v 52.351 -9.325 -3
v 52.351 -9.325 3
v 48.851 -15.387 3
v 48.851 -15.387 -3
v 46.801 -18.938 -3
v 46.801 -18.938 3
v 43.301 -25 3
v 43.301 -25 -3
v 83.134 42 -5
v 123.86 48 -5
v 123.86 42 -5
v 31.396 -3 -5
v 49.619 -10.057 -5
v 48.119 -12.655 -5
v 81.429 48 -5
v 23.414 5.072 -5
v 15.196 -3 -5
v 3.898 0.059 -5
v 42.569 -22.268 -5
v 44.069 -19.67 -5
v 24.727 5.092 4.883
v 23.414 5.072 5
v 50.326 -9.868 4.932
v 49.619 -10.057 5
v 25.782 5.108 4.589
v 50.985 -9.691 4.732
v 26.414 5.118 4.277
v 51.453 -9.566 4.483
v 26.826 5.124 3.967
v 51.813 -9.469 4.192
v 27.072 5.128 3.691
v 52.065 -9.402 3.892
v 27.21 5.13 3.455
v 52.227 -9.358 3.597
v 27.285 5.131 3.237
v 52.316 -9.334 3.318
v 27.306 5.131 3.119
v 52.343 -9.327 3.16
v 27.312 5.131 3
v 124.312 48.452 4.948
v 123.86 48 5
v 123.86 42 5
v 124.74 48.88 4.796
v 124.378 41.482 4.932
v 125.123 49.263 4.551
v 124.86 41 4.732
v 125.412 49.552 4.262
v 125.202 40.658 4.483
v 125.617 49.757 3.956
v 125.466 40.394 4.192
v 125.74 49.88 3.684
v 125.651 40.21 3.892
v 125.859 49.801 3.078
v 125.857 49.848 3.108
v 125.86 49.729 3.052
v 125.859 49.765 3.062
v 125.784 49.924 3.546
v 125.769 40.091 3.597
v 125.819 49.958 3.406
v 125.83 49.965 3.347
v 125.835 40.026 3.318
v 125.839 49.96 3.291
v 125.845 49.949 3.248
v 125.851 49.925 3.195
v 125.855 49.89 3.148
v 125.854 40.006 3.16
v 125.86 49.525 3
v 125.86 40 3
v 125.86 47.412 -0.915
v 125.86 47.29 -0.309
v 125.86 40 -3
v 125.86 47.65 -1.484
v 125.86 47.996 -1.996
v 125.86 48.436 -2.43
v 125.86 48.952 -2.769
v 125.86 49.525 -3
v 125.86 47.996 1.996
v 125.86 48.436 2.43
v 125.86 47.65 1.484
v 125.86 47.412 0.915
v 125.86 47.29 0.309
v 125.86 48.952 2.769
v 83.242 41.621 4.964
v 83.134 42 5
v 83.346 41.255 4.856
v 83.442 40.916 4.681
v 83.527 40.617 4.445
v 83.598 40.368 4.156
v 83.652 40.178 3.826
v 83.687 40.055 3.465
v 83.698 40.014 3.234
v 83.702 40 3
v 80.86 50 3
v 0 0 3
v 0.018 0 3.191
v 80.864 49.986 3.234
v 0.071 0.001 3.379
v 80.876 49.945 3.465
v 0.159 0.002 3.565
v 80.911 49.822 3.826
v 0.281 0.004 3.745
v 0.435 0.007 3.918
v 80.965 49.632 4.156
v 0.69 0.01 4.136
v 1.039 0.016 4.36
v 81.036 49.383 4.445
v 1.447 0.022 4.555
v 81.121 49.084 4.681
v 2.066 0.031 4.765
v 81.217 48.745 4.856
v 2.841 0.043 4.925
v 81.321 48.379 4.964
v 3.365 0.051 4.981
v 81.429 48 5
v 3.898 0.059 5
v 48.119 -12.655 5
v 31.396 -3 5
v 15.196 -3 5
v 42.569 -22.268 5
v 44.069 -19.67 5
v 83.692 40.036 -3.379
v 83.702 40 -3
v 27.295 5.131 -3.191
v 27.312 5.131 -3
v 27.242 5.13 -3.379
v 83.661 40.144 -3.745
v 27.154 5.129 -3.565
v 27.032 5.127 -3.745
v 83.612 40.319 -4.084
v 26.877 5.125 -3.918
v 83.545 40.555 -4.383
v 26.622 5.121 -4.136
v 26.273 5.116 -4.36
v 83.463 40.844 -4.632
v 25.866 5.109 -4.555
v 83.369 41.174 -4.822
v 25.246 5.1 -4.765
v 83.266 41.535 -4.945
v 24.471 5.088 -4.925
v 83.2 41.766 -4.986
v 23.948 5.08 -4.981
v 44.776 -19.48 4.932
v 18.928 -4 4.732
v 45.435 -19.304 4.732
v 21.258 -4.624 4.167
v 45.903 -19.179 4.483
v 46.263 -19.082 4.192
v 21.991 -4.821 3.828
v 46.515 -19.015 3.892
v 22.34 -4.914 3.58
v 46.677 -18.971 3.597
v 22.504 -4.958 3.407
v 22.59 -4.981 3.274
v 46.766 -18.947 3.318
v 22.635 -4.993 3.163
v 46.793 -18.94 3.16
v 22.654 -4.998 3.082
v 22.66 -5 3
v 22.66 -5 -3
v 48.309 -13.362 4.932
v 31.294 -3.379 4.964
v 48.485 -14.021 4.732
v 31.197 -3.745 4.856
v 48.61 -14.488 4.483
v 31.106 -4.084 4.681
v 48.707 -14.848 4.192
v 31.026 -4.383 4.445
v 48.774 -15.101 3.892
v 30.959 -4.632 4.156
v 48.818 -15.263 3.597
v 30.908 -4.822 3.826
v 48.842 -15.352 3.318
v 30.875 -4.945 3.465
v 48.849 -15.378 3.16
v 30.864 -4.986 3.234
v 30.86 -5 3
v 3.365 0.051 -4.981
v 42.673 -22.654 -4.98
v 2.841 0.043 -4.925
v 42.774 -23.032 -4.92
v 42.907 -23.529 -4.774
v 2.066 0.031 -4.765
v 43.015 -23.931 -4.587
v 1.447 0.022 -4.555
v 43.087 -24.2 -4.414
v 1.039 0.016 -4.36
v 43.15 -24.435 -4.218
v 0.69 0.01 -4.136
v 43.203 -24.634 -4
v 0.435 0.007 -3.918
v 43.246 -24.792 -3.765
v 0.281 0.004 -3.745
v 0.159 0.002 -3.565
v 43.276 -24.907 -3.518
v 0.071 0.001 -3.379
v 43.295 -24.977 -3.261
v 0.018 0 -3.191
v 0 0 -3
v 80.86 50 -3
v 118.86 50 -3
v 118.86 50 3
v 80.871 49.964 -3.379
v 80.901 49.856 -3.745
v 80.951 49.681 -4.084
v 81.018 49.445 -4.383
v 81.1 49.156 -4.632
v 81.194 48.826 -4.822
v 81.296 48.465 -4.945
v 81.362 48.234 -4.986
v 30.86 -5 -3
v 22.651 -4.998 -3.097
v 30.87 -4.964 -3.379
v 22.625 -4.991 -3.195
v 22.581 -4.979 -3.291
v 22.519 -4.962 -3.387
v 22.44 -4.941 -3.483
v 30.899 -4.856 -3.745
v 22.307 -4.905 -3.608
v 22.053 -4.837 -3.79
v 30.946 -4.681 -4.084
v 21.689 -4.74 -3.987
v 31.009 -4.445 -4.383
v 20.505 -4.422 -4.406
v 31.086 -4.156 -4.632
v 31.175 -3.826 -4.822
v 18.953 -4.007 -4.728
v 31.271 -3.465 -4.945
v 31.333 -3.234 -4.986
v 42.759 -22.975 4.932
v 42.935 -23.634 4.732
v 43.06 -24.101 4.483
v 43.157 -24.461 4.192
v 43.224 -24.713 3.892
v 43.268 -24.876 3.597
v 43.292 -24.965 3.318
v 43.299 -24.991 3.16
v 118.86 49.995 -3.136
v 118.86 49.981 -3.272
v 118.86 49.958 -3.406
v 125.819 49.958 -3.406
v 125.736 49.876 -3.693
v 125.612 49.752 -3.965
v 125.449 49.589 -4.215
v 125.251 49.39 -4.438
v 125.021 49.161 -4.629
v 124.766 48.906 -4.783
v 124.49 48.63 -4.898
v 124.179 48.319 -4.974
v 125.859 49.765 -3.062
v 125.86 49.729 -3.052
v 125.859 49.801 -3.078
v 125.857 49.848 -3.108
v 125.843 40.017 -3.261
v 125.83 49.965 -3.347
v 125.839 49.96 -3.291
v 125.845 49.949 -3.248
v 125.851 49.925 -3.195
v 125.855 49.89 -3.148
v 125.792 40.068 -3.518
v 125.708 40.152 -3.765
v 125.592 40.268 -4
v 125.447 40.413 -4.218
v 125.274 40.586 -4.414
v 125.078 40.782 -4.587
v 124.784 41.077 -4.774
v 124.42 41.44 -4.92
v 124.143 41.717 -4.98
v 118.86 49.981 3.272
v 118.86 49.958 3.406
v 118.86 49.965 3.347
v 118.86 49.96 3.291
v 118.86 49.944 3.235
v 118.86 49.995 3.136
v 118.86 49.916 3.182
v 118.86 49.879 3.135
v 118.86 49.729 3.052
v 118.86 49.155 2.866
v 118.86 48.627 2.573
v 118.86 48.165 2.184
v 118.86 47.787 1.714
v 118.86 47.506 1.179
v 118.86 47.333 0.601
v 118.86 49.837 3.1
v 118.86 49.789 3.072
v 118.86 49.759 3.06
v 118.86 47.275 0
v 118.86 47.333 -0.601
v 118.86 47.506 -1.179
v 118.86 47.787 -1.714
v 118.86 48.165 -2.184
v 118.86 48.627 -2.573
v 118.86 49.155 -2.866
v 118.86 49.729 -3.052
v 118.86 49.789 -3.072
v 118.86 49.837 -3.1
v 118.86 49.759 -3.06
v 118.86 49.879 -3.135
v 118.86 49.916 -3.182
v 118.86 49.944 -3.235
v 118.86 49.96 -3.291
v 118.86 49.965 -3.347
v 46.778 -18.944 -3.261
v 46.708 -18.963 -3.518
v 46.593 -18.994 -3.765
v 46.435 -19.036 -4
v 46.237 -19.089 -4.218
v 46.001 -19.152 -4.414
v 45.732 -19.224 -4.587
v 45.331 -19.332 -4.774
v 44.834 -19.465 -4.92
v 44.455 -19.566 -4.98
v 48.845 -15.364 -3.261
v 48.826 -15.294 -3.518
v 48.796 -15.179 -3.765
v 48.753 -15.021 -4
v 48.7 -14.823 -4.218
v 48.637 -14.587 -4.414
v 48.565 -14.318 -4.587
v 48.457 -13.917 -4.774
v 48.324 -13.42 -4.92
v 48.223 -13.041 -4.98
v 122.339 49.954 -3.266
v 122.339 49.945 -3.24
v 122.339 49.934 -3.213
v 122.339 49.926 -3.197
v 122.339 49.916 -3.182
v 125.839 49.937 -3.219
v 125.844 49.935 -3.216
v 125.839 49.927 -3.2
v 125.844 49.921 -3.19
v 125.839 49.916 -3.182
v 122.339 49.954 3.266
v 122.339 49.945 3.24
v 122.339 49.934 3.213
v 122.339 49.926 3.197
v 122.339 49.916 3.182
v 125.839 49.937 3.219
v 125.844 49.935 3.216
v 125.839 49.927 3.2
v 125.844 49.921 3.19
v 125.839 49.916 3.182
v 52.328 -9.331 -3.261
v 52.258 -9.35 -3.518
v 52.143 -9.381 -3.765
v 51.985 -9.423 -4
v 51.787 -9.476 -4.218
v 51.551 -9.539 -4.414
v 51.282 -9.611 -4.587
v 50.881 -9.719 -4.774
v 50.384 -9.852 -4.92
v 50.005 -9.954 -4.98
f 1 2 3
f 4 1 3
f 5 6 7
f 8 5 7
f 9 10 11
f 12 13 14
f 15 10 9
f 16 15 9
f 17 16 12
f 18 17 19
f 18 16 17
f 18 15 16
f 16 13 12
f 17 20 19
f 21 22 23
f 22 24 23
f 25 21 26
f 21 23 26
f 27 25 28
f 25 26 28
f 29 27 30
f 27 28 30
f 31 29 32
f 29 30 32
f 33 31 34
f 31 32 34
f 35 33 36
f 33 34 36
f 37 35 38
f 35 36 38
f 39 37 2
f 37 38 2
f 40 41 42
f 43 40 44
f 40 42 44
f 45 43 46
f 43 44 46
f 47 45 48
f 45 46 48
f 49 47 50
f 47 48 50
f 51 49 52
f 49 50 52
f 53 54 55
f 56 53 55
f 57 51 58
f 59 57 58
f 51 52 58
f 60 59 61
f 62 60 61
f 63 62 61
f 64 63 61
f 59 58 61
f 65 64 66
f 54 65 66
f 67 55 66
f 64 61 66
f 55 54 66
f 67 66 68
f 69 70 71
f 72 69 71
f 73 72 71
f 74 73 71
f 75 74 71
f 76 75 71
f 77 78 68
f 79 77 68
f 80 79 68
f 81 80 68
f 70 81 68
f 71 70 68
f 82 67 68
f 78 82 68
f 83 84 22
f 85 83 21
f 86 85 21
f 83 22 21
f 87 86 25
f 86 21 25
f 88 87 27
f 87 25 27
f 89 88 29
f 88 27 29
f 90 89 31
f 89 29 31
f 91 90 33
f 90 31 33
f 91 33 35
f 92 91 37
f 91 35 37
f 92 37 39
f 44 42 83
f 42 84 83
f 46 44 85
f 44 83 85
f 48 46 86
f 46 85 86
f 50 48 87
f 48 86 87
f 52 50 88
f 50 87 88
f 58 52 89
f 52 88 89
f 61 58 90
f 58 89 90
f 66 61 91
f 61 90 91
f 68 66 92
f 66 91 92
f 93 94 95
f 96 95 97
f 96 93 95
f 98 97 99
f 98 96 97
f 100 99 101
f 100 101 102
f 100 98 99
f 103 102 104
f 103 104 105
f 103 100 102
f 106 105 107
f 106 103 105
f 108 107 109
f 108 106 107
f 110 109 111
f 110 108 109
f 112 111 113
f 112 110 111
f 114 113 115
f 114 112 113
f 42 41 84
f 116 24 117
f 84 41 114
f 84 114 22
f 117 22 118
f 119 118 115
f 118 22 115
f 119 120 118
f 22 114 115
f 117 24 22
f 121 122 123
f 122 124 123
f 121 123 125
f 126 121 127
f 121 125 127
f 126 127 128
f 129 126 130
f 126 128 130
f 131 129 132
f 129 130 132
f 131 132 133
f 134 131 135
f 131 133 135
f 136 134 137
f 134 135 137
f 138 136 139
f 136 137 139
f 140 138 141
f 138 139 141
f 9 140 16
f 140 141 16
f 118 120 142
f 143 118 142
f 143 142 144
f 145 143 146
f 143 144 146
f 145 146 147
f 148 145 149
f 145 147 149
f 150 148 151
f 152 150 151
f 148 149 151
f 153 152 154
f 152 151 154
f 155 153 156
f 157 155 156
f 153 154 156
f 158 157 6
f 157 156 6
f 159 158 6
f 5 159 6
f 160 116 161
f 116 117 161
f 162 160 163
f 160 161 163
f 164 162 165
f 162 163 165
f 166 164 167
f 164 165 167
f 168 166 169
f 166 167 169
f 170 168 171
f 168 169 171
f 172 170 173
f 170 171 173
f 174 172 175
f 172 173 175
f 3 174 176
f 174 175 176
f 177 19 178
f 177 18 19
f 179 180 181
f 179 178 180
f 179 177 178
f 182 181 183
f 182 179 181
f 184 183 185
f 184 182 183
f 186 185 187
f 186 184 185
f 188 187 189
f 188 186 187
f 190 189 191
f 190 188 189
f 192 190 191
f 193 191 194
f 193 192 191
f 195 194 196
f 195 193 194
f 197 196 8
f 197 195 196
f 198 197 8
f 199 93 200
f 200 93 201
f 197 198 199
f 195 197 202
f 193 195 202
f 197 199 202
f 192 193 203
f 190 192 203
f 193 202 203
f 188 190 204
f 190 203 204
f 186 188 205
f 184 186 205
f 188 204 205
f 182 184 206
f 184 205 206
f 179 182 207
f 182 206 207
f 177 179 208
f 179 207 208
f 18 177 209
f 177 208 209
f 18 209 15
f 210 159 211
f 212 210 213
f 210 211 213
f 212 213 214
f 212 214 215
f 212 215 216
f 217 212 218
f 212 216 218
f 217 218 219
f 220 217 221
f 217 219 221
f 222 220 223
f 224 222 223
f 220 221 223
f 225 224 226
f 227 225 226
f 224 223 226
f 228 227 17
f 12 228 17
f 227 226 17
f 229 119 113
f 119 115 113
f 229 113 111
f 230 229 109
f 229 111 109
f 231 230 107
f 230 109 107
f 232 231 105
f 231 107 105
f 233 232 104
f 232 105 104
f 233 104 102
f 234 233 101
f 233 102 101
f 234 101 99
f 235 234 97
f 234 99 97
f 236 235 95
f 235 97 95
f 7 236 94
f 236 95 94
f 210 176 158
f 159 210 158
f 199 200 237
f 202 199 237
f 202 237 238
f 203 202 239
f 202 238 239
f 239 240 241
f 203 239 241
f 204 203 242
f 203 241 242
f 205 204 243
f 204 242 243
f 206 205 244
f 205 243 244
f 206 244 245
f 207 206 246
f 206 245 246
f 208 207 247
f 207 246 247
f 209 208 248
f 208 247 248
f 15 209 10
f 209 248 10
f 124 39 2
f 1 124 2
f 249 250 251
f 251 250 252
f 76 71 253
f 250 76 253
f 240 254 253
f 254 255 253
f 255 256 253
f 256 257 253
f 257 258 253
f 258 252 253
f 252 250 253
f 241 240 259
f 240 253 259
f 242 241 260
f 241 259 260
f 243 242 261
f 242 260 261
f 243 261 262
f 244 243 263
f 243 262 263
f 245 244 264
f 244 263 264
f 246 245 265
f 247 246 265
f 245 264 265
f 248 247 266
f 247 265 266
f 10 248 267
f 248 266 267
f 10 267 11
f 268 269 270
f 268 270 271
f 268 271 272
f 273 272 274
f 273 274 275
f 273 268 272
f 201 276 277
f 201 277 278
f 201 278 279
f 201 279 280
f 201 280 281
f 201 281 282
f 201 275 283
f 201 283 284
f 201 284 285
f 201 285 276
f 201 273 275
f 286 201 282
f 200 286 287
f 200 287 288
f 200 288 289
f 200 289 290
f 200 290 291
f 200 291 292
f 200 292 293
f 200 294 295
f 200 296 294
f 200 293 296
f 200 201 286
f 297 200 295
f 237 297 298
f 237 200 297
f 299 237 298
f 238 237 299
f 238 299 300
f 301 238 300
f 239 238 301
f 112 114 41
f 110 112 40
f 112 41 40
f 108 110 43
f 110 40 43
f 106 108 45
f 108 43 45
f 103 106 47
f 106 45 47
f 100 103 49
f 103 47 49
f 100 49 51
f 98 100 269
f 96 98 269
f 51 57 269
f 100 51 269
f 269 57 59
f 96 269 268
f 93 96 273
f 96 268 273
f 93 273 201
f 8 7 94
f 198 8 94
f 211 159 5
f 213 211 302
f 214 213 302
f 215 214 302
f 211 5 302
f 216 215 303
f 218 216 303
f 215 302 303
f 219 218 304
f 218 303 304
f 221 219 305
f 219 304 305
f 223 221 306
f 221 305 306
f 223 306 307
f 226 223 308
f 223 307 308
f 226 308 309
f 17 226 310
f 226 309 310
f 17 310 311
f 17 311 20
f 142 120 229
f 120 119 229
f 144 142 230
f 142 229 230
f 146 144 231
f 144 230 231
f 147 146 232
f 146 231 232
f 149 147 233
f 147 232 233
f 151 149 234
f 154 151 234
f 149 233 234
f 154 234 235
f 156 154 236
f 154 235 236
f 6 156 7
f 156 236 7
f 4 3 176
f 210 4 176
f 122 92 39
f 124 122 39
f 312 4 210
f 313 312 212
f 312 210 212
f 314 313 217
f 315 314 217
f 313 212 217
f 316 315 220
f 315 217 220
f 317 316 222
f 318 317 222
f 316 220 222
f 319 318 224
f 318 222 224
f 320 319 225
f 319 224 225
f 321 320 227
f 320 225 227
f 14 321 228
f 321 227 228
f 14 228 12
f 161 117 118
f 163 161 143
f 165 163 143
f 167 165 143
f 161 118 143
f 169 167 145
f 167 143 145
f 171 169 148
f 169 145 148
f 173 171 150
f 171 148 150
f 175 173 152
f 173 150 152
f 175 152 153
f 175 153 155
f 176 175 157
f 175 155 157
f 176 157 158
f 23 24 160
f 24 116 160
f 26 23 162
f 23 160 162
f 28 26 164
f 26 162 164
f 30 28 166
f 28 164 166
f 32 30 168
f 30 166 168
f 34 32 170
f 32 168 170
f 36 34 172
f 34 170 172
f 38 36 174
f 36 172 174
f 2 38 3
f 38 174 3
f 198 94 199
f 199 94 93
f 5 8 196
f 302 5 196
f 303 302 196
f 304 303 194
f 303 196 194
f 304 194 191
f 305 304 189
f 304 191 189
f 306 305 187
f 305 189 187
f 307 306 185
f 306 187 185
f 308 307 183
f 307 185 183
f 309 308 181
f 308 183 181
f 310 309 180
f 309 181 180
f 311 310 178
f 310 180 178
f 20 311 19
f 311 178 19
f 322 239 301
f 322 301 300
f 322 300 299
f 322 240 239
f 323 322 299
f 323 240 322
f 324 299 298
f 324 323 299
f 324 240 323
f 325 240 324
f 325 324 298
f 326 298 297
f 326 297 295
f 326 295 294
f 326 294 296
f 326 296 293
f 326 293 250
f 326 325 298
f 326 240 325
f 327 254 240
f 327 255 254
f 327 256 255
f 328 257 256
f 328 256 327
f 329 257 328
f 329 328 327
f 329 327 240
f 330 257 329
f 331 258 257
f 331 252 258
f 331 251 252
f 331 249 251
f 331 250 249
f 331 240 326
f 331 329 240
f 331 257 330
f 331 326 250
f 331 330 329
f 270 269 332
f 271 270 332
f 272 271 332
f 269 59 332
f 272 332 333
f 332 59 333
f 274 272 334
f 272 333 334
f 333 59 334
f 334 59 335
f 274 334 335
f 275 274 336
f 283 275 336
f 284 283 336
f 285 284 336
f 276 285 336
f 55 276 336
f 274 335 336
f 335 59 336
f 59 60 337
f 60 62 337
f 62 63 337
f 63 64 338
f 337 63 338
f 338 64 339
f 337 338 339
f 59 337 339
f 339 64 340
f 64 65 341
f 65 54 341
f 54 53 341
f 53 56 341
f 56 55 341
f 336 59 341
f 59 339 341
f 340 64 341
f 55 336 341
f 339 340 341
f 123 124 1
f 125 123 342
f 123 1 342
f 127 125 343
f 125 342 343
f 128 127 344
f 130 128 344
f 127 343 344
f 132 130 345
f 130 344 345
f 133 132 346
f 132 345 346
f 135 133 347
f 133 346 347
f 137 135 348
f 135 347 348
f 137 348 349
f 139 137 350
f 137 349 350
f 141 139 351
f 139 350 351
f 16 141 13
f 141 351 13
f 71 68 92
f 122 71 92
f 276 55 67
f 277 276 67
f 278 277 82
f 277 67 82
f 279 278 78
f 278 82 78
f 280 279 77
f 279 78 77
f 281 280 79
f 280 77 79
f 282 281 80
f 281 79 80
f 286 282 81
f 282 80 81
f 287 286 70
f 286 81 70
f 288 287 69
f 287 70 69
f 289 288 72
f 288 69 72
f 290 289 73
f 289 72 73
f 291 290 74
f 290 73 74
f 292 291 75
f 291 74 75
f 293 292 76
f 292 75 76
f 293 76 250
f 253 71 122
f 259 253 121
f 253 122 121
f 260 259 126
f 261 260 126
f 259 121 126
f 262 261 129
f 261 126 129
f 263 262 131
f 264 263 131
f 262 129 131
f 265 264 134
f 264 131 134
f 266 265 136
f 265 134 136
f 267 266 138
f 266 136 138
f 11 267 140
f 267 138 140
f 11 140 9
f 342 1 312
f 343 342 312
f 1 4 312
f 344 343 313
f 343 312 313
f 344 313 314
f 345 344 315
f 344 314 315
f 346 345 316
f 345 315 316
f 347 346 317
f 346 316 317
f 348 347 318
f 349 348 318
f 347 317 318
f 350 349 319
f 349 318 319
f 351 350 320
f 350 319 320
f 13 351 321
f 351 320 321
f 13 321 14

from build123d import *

# Parameters (mm, degrees)
BOSS_EXTRUDE1_DEPTH = 5
FILLET1_R           = 2
SKETCH2_R           = 3.125
CUT_EXTRUDE1_DEPTH  = 7
FILLET2_R           = 0.3


with BuildPart() as part:
    # Sketch1 → Boss-Extrude1 (new, symmetric)
    with BuildSketch(Plane.XY):
        Polygon((0, 0), (80.860254038, 50), (125.860254038, 50), (125.860254038, 40), (83.702282943, 40), (27.312387914, 5.13126523), (52.351270189, -9.324940192), (48.851270189, -15.387118018), (30.860254038, -5), (22.660254038, -5), (46.801270189, -18.937822174), (43.301270189, -25), align=None)
    extrude(amount=BOSS_EXTRUDE1_DEPTH, both=True)

    # Fillet1
    fillet1_edges = [part.edges().sort_by_distance(p)[0] for p in [
        (40.430127019, 25, -5),
        (103.360254038, 50, -5),
        (34.730762114, -11.968911087, 5),
        (125.860254038, 45, -5),
        (104.78126849, 40, -5),
        (55.507335428, 22.565632615, -5),
        (39.831829052, -2.096837481, -5),
        (50.601270189, -12.356029105, -5),
        (39.855762114, -10.193559009, -5),
        (26.760254038, -5, -5),
        (34.730762114, -11.968911087, -5),
        (45.051270189, -21.968911087, -5),
        (21.650635095, -12.5, -5),
        (26.760254038, -5, 5),
        (39.855762114, -10.193559009, 5),
        (50.601270189, -12.356029105, 5),
        (39.831829052, -2.096837481, 5),
        (55.507335428, 22.565632615, 5),
        (104.78126849, 40, 5),
        (125.860254038, 45, 5),
        (103.360254038, 50, 5),
        (40.430127019, 25, 5),
        (21.650635095, -12.5, 5),
        (45.051270189, -21.968911087, 5),
    ]]
    fillet(fillet1_edges, radius=FILLET1_R)

    # Sketch2 → Cut-Extrude1 (cut)
    with BuildSketch(Plane(origin=(125.860254038, 0, 0), x_dir=(0, 0, -1), z_dir=(1, 0, 0))):
        with Locations((0, 50.4)):
            Circle(SKETCH2_R)
    extrude(amount=-CUT_EXTRUDE1_DEPTH, mode=Mode.SUBTRACT)

    # Fillet2
    fillet2_edges = [part.edges().sort_by_distance(p)[0] for p in [
        (122.359028731, 49.997549387, 3.098977009),
        (122.359028731, 49.997549387, -3.098977009),
    ]]
    fillet(fillet2_edges, radius=FILLET2_R)


solid = part.part
